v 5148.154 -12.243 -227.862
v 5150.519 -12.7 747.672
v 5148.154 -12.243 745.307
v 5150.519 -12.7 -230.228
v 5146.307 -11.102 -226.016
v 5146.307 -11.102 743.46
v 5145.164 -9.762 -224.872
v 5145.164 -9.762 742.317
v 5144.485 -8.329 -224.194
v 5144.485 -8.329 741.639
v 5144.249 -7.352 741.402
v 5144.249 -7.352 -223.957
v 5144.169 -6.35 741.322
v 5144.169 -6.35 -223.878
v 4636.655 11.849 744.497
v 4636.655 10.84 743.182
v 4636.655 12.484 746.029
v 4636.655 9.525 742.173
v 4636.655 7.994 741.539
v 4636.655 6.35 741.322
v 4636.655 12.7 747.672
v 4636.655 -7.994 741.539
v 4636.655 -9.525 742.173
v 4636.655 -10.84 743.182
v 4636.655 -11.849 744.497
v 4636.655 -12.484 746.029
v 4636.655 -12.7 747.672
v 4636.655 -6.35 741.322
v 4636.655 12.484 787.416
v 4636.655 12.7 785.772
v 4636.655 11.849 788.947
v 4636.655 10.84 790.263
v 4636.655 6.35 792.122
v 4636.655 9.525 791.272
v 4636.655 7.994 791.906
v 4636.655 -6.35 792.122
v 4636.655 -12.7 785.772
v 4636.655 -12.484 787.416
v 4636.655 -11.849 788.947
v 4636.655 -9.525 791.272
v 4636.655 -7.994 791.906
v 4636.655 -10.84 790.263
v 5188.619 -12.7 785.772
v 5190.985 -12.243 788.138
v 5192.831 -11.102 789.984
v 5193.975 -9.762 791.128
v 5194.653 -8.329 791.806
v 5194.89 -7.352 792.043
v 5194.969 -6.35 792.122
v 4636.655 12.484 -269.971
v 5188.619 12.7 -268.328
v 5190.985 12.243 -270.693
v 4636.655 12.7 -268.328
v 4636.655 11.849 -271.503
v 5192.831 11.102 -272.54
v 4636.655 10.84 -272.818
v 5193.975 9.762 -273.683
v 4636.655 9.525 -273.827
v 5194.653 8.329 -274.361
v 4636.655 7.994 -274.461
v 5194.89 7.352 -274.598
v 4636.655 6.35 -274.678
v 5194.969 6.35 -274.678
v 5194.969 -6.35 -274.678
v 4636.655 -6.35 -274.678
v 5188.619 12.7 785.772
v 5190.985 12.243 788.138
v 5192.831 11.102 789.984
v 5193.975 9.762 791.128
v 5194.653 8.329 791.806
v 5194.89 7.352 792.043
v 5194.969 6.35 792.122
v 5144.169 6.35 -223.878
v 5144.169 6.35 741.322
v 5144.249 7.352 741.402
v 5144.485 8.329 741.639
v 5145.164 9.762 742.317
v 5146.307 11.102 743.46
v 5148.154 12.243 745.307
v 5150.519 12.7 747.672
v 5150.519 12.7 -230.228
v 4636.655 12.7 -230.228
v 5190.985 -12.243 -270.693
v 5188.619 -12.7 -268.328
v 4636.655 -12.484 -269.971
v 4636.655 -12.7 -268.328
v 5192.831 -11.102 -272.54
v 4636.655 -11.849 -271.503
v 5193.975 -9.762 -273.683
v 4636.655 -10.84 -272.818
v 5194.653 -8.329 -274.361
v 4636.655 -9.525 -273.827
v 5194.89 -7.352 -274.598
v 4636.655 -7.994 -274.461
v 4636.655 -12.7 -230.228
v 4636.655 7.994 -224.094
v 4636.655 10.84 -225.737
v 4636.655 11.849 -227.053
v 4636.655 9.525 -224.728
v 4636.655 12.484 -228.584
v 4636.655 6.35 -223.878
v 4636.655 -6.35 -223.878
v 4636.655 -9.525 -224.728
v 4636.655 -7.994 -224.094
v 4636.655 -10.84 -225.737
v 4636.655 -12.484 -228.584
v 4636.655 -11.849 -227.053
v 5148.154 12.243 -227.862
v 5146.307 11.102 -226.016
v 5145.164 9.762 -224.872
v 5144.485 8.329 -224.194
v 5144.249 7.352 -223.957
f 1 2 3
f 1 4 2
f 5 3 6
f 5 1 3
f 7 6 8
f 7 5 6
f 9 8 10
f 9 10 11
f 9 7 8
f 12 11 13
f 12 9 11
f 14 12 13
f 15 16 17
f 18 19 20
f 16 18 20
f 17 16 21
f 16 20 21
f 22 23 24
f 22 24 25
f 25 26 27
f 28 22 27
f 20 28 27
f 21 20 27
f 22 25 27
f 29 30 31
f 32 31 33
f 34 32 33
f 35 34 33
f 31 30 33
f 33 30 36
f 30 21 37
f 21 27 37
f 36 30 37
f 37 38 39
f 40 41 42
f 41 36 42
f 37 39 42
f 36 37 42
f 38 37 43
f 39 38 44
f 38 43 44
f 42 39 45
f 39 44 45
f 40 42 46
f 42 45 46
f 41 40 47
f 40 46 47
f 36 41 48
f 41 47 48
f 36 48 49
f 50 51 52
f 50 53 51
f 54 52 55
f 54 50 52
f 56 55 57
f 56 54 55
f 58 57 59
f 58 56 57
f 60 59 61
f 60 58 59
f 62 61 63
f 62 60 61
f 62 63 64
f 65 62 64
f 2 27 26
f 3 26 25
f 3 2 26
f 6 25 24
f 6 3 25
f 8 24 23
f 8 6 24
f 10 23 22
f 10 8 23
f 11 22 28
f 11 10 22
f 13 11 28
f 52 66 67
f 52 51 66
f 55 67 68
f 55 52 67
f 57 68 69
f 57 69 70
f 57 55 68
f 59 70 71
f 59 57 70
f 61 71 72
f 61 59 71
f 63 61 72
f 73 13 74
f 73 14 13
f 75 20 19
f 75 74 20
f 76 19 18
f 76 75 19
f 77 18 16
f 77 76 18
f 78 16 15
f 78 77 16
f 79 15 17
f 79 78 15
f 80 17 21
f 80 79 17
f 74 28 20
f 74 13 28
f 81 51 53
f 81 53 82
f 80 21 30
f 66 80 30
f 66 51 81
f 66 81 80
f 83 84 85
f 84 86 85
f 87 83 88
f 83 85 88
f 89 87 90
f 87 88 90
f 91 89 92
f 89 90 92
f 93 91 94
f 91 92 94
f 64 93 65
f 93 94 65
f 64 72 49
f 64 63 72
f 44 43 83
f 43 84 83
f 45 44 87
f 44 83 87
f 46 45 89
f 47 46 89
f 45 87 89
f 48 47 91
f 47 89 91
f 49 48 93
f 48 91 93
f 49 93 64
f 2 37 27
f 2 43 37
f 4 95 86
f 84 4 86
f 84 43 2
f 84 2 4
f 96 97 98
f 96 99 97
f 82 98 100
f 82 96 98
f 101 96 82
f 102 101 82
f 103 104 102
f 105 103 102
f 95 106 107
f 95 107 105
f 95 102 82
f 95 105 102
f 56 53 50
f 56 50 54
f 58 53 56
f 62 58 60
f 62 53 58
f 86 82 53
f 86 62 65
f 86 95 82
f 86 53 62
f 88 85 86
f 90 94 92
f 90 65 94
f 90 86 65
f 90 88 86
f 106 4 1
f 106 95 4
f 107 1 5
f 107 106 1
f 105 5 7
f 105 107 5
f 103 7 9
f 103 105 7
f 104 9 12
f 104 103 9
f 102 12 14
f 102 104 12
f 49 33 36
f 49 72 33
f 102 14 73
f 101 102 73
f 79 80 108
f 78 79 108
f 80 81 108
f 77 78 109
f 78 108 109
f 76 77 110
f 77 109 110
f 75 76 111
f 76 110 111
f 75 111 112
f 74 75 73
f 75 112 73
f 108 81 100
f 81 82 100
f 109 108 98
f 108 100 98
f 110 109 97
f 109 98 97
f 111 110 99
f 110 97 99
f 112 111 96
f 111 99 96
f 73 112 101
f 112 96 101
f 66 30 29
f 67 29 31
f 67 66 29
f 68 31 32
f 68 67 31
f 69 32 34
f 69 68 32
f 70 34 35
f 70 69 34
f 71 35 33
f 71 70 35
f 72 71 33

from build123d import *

# Parameters (mm, degrees)
F3_W = 25.4
F3_H = 50.8
F5_R = 6.35


with BuildPart() as f4:
    # F4: sweep along a path in F1
    with BuildLine(Plane.XZ) as f4_path:
        Line((4636.6553444, 766.7224442), (5169.5693154, 766.7224442))
        Line((5169.5693154, 766.7224442), (5169.5693154, -249.2775558))
        Line((5169.5693154, -249.2775558), (4636.6553444, -249.2775558))
    # F3 (on plane+point) → F4 (sweep)
    with BuildSketch(Plane.YZ.offset(4636.6553444)):
        with Locations((0, 766.7224442)):
            Rectangle(F3_W, F3_H)
    sweep(path=f4_path.line, transition=Transition.RIGHT)

    # F5
    f5_edges = [f4.edges().sort_by_distance(p)[0] for p in [
        (4890.41233, 12.7, -223.877556),
        (5144.169315, 12.7, 258.722444),
        (5194.969315, 12.7, 258.722444),
        (4915.81233, 12.7, -274.677556),
        (4890.41233, -12.7, -223.877556),
        (5144.169315, -12.7, 258.722444),
        (4890.41233, 12.7, 741.322444),
        (4915.81233, 12.7, 792.122444),
        (4915.81233, -12.7, 792.122444),
        (4890.41233, -12.7, 741.322444),
        (5194.969315, -12.7, 258.722444),
        (4915.81233, -12.7, -274.677556),
    ]]
    fillet(f5_edges, radius=F5_R)


solid = f4.part
